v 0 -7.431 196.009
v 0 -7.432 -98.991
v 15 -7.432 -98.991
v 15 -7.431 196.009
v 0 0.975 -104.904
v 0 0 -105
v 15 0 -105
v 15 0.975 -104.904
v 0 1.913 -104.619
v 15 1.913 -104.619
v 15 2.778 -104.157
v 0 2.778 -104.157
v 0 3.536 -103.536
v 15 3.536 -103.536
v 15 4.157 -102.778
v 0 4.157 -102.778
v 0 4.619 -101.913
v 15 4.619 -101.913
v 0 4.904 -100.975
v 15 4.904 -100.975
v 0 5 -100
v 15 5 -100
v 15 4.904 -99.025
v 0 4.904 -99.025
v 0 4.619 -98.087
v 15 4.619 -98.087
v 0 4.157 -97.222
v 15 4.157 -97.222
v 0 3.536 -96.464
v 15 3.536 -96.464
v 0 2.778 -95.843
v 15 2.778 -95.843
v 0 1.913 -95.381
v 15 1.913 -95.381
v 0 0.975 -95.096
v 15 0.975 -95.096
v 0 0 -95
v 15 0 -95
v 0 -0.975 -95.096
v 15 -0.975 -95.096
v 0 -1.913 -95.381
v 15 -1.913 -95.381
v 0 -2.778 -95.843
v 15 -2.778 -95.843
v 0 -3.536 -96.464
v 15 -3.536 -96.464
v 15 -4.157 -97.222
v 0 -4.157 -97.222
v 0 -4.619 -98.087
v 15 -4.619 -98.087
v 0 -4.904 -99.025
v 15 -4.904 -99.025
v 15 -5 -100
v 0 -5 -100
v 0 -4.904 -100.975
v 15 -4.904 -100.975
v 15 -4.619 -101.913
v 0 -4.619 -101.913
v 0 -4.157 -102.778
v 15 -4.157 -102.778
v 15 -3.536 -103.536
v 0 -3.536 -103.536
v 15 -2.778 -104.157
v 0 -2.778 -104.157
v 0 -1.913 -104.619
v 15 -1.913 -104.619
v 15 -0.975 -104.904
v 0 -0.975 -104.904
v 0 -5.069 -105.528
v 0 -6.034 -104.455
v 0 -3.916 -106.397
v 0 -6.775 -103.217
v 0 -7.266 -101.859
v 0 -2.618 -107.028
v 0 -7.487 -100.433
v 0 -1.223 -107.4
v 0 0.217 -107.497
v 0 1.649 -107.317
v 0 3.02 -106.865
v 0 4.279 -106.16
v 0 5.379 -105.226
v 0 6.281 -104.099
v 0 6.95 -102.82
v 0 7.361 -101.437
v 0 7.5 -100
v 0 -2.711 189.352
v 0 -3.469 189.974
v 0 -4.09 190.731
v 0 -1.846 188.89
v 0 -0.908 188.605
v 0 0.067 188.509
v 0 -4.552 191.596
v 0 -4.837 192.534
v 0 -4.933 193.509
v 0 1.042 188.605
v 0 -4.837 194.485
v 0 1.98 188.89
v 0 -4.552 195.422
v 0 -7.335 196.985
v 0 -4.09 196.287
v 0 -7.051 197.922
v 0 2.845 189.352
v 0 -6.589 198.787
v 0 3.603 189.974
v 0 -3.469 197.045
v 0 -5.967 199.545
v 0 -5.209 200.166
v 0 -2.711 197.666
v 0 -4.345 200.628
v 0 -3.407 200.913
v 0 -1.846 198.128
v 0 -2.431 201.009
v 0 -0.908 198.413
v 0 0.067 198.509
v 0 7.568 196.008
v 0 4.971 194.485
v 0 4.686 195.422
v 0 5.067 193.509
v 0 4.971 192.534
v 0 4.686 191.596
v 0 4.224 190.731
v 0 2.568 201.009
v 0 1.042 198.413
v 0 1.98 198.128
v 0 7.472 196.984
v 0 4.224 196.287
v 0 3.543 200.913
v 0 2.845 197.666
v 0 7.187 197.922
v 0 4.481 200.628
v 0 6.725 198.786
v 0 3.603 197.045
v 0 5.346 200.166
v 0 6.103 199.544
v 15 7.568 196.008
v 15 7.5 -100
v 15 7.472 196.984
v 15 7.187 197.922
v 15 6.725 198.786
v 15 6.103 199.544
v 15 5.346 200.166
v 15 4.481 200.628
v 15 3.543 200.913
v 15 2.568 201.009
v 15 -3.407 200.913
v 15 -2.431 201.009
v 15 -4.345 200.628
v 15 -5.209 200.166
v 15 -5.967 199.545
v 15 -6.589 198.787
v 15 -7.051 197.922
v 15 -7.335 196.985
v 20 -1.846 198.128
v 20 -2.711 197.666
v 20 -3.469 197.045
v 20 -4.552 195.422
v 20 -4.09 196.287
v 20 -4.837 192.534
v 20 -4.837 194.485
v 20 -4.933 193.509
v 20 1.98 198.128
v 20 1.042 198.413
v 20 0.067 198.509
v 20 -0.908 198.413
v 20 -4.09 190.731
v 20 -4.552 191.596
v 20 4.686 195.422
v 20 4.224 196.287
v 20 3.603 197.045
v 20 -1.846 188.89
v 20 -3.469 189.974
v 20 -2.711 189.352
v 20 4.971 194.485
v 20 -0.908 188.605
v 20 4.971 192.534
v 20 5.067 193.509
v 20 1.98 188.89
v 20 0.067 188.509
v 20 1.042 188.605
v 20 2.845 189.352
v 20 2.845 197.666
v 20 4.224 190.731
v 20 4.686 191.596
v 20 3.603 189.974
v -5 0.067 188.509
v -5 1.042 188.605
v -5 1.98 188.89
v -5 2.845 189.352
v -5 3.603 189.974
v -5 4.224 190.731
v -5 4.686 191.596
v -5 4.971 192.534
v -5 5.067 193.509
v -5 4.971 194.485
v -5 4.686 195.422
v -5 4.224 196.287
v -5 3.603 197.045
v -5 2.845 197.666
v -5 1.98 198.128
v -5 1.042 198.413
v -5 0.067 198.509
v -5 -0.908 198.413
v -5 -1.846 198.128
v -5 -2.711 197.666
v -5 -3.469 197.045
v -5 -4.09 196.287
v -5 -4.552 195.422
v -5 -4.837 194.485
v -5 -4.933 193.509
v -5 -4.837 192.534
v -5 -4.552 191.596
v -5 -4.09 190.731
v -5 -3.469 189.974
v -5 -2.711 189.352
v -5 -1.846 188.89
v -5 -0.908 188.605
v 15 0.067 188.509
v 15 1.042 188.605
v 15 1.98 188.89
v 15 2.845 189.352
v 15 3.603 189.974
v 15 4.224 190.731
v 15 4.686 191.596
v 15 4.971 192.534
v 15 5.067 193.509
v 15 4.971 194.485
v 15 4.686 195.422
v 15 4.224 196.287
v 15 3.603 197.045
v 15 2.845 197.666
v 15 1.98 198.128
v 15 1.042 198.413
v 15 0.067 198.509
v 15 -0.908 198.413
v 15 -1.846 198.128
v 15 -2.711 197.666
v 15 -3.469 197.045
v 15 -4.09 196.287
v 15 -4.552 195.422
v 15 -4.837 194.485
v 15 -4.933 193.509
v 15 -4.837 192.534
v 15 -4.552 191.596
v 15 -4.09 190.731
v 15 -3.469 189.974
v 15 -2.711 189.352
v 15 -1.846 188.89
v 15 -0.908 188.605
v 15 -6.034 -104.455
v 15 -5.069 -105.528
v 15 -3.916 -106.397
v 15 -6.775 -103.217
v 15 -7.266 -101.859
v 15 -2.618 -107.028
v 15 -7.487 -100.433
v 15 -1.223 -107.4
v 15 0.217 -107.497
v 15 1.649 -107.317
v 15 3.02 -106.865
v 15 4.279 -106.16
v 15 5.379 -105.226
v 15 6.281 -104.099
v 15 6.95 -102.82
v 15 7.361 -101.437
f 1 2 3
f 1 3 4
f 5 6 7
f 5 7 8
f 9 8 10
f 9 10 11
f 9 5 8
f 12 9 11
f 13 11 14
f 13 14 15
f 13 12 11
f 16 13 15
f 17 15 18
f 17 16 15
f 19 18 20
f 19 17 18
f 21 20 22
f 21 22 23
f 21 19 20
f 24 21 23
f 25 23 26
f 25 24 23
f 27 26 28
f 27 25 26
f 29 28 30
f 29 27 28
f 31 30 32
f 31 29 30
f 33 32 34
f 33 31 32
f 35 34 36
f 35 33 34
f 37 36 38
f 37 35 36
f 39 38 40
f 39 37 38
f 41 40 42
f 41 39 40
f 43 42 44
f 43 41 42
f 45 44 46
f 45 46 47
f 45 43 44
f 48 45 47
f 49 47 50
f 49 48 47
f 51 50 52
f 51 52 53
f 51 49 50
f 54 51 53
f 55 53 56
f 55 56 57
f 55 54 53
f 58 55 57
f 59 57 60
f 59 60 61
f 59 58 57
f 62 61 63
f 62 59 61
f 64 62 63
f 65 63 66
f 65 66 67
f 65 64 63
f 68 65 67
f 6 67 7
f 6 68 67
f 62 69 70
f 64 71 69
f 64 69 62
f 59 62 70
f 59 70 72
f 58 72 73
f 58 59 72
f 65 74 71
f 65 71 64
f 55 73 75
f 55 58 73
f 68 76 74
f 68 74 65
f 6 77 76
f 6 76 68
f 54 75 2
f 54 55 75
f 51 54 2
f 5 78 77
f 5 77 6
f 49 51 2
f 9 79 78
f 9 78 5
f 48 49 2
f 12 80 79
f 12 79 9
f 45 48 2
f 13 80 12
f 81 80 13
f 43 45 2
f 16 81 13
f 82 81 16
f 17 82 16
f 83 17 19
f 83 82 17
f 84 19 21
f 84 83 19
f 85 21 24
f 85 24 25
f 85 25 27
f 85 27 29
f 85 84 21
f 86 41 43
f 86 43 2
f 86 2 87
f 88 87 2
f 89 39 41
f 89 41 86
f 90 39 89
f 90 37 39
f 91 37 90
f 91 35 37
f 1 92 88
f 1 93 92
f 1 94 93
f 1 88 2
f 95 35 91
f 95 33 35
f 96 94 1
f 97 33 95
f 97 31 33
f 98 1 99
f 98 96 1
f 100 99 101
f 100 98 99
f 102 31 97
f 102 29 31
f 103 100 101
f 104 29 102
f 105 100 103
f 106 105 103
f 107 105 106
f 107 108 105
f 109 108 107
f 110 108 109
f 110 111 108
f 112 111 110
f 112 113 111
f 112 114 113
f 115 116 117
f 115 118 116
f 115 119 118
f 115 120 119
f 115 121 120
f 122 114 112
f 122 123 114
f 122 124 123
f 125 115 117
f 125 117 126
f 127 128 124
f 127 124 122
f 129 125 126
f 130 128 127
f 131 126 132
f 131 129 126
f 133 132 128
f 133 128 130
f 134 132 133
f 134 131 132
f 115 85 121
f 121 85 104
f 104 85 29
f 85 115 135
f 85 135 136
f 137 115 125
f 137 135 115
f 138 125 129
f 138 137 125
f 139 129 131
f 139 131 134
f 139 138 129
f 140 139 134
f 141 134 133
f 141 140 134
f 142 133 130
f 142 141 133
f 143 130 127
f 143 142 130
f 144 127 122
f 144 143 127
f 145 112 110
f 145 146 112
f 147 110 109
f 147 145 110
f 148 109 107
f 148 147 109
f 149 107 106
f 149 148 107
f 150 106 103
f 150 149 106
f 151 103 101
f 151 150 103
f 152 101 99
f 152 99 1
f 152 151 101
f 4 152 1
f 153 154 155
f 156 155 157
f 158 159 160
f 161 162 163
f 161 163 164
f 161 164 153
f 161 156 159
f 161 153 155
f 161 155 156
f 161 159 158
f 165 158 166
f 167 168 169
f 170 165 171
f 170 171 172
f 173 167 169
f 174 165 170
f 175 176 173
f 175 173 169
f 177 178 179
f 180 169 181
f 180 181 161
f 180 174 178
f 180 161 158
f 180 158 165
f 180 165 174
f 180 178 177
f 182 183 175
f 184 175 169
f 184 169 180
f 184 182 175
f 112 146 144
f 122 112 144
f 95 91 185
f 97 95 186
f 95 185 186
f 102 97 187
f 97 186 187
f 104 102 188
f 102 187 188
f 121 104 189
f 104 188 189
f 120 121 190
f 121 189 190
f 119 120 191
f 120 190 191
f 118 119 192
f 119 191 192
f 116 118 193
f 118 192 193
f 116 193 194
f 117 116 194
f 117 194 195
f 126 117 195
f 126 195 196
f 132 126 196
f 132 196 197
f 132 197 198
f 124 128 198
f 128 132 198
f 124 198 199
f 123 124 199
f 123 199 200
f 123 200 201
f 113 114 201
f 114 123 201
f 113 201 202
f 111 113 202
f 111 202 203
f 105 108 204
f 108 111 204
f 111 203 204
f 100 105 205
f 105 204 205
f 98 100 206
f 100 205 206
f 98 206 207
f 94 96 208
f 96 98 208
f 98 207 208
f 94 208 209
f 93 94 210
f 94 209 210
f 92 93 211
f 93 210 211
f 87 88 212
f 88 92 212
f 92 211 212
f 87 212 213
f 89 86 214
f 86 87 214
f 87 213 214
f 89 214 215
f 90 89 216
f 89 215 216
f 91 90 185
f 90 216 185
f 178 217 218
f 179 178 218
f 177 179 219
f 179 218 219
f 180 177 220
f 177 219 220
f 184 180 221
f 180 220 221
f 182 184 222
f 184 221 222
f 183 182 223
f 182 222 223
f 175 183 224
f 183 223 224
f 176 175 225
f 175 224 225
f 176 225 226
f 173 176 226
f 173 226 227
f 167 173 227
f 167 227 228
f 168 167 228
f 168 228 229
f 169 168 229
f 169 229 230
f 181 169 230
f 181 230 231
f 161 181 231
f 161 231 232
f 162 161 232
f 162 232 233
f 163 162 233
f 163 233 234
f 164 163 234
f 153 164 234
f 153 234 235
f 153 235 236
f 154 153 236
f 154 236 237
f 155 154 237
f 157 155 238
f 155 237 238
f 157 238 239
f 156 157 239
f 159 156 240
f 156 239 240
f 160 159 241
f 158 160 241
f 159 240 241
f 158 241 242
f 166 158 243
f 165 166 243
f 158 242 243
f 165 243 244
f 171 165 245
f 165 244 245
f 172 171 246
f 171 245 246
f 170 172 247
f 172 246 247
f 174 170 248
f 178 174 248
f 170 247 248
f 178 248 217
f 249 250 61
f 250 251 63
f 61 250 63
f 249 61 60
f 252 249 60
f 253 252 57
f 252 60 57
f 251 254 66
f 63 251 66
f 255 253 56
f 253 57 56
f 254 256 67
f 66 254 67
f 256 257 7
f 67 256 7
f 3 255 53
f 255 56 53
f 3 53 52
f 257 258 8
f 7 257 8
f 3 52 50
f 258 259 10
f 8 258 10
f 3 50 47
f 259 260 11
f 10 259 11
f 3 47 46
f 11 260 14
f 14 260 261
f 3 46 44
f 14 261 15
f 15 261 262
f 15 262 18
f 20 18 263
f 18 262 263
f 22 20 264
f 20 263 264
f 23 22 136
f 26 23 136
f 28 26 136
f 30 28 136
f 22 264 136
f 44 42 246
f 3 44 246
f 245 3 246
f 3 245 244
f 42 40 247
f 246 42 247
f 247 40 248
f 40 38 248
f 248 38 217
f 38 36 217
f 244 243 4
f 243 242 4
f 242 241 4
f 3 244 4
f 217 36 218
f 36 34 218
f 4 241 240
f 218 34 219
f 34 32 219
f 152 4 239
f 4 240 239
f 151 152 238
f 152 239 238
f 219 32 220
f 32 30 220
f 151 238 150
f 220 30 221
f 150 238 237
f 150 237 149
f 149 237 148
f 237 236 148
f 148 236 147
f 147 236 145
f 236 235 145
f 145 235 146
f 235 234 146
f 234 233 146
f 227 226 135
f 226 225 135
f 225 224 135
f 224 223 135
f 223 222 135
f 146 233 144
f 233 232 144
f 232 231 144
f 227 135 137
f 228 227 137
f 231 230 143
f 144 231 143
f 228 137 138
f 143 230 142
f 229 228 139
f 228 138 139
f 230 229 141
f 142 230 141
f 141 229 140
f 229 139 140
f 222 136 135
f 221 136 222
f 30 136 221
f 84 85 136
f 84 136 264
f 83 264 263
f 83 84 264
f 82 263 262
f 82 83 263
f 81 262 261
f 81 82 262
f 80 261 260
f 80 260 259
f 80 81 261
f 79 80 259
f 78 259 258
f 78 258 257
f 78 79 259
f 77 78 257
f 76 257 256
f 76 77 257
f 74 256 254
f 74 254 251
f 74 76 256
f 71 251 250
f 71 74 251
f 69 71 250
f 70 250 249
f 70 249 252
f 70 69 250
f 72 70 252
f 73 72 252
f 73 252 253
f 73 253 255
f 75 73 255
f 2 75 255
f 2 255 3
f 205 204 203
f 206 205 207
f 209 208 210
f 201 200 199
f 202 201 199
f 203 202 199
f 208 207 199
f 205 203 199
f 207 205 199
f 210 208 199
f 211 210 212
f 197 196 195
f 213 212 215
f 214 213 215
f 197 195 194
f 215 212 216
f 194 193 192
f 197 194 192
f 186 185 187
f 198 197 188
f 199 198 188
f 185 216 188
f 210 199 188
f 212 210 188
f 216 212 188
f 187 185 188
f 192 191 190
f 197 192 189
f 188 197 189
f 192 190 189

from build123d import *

# Parameters (mm, degrees)
SKETCH1_R                = 5
BOSS_EXTRUDE1_DEPTH      = 15
BOSS_EXTRUDE3_DEPTH      = 5
BOSS_EXTRUDE3_DEPTH_BACK = 20
SKETCH4_R                = 5
FILLET1_R                = 5


with BuildPart() as part:
    # Sketch1 → Boss-Extrude1 (new body)
    with BuildSketch(Plane(origin=(0, 0, 0), x_dir=(0, 0, -1), z_dir=(1, 0, 0))):
        with BuildLine():
            Line((-201.009068176, 7.568692759), (100, 7.5))
            ThreePointArc((100, 7.5), (107.48293277, -0.50568484), (98.990931823, -7.431808758))
            Line((98.990931823, -7.431808758), (-201.009068176, -7.431307241))
            Line((-201.009068176, -7.431307241), (-201.009068176, 7.568692759))
        make_face()
        with Locations((100, 0)):
            Circle(SKETCH1_R, mode=Mode.SUBTRACT)
    extrude(amount=BOSS_EXTRUDE1_DEPTH)

    # Sketch4 → Boss-Extrude3 (add, two sides: drawn at the far end of the back side and taken through both)
    with BuildSketch(Plane(origin=(15, 0, 0), x_dir=(0, 0, -1), z_dir=(1, 0, 0)).offset(-BOSS_EXTRUDE3_DEPTH_BACK)):
        with Locations((-193.509068176, 0.066981001)):
            Circle(SKETCH4_R)
    extrude(amount=BOSS_EXTRUDE3_DEPTH + BOSS_EXTRUDE3_DEPTH_BACK)

    # Fillet1
    fillet1_edges = [part.edges().sort_by_distance(p)[0] for p in [
        (7.5, 7.568692759, 201.009068176),
        (7.5, -7.431307241, 201.009068176),
    ]]
    fillet(fillet1_edges, radius=FILLET1_R)


solid = part.part
